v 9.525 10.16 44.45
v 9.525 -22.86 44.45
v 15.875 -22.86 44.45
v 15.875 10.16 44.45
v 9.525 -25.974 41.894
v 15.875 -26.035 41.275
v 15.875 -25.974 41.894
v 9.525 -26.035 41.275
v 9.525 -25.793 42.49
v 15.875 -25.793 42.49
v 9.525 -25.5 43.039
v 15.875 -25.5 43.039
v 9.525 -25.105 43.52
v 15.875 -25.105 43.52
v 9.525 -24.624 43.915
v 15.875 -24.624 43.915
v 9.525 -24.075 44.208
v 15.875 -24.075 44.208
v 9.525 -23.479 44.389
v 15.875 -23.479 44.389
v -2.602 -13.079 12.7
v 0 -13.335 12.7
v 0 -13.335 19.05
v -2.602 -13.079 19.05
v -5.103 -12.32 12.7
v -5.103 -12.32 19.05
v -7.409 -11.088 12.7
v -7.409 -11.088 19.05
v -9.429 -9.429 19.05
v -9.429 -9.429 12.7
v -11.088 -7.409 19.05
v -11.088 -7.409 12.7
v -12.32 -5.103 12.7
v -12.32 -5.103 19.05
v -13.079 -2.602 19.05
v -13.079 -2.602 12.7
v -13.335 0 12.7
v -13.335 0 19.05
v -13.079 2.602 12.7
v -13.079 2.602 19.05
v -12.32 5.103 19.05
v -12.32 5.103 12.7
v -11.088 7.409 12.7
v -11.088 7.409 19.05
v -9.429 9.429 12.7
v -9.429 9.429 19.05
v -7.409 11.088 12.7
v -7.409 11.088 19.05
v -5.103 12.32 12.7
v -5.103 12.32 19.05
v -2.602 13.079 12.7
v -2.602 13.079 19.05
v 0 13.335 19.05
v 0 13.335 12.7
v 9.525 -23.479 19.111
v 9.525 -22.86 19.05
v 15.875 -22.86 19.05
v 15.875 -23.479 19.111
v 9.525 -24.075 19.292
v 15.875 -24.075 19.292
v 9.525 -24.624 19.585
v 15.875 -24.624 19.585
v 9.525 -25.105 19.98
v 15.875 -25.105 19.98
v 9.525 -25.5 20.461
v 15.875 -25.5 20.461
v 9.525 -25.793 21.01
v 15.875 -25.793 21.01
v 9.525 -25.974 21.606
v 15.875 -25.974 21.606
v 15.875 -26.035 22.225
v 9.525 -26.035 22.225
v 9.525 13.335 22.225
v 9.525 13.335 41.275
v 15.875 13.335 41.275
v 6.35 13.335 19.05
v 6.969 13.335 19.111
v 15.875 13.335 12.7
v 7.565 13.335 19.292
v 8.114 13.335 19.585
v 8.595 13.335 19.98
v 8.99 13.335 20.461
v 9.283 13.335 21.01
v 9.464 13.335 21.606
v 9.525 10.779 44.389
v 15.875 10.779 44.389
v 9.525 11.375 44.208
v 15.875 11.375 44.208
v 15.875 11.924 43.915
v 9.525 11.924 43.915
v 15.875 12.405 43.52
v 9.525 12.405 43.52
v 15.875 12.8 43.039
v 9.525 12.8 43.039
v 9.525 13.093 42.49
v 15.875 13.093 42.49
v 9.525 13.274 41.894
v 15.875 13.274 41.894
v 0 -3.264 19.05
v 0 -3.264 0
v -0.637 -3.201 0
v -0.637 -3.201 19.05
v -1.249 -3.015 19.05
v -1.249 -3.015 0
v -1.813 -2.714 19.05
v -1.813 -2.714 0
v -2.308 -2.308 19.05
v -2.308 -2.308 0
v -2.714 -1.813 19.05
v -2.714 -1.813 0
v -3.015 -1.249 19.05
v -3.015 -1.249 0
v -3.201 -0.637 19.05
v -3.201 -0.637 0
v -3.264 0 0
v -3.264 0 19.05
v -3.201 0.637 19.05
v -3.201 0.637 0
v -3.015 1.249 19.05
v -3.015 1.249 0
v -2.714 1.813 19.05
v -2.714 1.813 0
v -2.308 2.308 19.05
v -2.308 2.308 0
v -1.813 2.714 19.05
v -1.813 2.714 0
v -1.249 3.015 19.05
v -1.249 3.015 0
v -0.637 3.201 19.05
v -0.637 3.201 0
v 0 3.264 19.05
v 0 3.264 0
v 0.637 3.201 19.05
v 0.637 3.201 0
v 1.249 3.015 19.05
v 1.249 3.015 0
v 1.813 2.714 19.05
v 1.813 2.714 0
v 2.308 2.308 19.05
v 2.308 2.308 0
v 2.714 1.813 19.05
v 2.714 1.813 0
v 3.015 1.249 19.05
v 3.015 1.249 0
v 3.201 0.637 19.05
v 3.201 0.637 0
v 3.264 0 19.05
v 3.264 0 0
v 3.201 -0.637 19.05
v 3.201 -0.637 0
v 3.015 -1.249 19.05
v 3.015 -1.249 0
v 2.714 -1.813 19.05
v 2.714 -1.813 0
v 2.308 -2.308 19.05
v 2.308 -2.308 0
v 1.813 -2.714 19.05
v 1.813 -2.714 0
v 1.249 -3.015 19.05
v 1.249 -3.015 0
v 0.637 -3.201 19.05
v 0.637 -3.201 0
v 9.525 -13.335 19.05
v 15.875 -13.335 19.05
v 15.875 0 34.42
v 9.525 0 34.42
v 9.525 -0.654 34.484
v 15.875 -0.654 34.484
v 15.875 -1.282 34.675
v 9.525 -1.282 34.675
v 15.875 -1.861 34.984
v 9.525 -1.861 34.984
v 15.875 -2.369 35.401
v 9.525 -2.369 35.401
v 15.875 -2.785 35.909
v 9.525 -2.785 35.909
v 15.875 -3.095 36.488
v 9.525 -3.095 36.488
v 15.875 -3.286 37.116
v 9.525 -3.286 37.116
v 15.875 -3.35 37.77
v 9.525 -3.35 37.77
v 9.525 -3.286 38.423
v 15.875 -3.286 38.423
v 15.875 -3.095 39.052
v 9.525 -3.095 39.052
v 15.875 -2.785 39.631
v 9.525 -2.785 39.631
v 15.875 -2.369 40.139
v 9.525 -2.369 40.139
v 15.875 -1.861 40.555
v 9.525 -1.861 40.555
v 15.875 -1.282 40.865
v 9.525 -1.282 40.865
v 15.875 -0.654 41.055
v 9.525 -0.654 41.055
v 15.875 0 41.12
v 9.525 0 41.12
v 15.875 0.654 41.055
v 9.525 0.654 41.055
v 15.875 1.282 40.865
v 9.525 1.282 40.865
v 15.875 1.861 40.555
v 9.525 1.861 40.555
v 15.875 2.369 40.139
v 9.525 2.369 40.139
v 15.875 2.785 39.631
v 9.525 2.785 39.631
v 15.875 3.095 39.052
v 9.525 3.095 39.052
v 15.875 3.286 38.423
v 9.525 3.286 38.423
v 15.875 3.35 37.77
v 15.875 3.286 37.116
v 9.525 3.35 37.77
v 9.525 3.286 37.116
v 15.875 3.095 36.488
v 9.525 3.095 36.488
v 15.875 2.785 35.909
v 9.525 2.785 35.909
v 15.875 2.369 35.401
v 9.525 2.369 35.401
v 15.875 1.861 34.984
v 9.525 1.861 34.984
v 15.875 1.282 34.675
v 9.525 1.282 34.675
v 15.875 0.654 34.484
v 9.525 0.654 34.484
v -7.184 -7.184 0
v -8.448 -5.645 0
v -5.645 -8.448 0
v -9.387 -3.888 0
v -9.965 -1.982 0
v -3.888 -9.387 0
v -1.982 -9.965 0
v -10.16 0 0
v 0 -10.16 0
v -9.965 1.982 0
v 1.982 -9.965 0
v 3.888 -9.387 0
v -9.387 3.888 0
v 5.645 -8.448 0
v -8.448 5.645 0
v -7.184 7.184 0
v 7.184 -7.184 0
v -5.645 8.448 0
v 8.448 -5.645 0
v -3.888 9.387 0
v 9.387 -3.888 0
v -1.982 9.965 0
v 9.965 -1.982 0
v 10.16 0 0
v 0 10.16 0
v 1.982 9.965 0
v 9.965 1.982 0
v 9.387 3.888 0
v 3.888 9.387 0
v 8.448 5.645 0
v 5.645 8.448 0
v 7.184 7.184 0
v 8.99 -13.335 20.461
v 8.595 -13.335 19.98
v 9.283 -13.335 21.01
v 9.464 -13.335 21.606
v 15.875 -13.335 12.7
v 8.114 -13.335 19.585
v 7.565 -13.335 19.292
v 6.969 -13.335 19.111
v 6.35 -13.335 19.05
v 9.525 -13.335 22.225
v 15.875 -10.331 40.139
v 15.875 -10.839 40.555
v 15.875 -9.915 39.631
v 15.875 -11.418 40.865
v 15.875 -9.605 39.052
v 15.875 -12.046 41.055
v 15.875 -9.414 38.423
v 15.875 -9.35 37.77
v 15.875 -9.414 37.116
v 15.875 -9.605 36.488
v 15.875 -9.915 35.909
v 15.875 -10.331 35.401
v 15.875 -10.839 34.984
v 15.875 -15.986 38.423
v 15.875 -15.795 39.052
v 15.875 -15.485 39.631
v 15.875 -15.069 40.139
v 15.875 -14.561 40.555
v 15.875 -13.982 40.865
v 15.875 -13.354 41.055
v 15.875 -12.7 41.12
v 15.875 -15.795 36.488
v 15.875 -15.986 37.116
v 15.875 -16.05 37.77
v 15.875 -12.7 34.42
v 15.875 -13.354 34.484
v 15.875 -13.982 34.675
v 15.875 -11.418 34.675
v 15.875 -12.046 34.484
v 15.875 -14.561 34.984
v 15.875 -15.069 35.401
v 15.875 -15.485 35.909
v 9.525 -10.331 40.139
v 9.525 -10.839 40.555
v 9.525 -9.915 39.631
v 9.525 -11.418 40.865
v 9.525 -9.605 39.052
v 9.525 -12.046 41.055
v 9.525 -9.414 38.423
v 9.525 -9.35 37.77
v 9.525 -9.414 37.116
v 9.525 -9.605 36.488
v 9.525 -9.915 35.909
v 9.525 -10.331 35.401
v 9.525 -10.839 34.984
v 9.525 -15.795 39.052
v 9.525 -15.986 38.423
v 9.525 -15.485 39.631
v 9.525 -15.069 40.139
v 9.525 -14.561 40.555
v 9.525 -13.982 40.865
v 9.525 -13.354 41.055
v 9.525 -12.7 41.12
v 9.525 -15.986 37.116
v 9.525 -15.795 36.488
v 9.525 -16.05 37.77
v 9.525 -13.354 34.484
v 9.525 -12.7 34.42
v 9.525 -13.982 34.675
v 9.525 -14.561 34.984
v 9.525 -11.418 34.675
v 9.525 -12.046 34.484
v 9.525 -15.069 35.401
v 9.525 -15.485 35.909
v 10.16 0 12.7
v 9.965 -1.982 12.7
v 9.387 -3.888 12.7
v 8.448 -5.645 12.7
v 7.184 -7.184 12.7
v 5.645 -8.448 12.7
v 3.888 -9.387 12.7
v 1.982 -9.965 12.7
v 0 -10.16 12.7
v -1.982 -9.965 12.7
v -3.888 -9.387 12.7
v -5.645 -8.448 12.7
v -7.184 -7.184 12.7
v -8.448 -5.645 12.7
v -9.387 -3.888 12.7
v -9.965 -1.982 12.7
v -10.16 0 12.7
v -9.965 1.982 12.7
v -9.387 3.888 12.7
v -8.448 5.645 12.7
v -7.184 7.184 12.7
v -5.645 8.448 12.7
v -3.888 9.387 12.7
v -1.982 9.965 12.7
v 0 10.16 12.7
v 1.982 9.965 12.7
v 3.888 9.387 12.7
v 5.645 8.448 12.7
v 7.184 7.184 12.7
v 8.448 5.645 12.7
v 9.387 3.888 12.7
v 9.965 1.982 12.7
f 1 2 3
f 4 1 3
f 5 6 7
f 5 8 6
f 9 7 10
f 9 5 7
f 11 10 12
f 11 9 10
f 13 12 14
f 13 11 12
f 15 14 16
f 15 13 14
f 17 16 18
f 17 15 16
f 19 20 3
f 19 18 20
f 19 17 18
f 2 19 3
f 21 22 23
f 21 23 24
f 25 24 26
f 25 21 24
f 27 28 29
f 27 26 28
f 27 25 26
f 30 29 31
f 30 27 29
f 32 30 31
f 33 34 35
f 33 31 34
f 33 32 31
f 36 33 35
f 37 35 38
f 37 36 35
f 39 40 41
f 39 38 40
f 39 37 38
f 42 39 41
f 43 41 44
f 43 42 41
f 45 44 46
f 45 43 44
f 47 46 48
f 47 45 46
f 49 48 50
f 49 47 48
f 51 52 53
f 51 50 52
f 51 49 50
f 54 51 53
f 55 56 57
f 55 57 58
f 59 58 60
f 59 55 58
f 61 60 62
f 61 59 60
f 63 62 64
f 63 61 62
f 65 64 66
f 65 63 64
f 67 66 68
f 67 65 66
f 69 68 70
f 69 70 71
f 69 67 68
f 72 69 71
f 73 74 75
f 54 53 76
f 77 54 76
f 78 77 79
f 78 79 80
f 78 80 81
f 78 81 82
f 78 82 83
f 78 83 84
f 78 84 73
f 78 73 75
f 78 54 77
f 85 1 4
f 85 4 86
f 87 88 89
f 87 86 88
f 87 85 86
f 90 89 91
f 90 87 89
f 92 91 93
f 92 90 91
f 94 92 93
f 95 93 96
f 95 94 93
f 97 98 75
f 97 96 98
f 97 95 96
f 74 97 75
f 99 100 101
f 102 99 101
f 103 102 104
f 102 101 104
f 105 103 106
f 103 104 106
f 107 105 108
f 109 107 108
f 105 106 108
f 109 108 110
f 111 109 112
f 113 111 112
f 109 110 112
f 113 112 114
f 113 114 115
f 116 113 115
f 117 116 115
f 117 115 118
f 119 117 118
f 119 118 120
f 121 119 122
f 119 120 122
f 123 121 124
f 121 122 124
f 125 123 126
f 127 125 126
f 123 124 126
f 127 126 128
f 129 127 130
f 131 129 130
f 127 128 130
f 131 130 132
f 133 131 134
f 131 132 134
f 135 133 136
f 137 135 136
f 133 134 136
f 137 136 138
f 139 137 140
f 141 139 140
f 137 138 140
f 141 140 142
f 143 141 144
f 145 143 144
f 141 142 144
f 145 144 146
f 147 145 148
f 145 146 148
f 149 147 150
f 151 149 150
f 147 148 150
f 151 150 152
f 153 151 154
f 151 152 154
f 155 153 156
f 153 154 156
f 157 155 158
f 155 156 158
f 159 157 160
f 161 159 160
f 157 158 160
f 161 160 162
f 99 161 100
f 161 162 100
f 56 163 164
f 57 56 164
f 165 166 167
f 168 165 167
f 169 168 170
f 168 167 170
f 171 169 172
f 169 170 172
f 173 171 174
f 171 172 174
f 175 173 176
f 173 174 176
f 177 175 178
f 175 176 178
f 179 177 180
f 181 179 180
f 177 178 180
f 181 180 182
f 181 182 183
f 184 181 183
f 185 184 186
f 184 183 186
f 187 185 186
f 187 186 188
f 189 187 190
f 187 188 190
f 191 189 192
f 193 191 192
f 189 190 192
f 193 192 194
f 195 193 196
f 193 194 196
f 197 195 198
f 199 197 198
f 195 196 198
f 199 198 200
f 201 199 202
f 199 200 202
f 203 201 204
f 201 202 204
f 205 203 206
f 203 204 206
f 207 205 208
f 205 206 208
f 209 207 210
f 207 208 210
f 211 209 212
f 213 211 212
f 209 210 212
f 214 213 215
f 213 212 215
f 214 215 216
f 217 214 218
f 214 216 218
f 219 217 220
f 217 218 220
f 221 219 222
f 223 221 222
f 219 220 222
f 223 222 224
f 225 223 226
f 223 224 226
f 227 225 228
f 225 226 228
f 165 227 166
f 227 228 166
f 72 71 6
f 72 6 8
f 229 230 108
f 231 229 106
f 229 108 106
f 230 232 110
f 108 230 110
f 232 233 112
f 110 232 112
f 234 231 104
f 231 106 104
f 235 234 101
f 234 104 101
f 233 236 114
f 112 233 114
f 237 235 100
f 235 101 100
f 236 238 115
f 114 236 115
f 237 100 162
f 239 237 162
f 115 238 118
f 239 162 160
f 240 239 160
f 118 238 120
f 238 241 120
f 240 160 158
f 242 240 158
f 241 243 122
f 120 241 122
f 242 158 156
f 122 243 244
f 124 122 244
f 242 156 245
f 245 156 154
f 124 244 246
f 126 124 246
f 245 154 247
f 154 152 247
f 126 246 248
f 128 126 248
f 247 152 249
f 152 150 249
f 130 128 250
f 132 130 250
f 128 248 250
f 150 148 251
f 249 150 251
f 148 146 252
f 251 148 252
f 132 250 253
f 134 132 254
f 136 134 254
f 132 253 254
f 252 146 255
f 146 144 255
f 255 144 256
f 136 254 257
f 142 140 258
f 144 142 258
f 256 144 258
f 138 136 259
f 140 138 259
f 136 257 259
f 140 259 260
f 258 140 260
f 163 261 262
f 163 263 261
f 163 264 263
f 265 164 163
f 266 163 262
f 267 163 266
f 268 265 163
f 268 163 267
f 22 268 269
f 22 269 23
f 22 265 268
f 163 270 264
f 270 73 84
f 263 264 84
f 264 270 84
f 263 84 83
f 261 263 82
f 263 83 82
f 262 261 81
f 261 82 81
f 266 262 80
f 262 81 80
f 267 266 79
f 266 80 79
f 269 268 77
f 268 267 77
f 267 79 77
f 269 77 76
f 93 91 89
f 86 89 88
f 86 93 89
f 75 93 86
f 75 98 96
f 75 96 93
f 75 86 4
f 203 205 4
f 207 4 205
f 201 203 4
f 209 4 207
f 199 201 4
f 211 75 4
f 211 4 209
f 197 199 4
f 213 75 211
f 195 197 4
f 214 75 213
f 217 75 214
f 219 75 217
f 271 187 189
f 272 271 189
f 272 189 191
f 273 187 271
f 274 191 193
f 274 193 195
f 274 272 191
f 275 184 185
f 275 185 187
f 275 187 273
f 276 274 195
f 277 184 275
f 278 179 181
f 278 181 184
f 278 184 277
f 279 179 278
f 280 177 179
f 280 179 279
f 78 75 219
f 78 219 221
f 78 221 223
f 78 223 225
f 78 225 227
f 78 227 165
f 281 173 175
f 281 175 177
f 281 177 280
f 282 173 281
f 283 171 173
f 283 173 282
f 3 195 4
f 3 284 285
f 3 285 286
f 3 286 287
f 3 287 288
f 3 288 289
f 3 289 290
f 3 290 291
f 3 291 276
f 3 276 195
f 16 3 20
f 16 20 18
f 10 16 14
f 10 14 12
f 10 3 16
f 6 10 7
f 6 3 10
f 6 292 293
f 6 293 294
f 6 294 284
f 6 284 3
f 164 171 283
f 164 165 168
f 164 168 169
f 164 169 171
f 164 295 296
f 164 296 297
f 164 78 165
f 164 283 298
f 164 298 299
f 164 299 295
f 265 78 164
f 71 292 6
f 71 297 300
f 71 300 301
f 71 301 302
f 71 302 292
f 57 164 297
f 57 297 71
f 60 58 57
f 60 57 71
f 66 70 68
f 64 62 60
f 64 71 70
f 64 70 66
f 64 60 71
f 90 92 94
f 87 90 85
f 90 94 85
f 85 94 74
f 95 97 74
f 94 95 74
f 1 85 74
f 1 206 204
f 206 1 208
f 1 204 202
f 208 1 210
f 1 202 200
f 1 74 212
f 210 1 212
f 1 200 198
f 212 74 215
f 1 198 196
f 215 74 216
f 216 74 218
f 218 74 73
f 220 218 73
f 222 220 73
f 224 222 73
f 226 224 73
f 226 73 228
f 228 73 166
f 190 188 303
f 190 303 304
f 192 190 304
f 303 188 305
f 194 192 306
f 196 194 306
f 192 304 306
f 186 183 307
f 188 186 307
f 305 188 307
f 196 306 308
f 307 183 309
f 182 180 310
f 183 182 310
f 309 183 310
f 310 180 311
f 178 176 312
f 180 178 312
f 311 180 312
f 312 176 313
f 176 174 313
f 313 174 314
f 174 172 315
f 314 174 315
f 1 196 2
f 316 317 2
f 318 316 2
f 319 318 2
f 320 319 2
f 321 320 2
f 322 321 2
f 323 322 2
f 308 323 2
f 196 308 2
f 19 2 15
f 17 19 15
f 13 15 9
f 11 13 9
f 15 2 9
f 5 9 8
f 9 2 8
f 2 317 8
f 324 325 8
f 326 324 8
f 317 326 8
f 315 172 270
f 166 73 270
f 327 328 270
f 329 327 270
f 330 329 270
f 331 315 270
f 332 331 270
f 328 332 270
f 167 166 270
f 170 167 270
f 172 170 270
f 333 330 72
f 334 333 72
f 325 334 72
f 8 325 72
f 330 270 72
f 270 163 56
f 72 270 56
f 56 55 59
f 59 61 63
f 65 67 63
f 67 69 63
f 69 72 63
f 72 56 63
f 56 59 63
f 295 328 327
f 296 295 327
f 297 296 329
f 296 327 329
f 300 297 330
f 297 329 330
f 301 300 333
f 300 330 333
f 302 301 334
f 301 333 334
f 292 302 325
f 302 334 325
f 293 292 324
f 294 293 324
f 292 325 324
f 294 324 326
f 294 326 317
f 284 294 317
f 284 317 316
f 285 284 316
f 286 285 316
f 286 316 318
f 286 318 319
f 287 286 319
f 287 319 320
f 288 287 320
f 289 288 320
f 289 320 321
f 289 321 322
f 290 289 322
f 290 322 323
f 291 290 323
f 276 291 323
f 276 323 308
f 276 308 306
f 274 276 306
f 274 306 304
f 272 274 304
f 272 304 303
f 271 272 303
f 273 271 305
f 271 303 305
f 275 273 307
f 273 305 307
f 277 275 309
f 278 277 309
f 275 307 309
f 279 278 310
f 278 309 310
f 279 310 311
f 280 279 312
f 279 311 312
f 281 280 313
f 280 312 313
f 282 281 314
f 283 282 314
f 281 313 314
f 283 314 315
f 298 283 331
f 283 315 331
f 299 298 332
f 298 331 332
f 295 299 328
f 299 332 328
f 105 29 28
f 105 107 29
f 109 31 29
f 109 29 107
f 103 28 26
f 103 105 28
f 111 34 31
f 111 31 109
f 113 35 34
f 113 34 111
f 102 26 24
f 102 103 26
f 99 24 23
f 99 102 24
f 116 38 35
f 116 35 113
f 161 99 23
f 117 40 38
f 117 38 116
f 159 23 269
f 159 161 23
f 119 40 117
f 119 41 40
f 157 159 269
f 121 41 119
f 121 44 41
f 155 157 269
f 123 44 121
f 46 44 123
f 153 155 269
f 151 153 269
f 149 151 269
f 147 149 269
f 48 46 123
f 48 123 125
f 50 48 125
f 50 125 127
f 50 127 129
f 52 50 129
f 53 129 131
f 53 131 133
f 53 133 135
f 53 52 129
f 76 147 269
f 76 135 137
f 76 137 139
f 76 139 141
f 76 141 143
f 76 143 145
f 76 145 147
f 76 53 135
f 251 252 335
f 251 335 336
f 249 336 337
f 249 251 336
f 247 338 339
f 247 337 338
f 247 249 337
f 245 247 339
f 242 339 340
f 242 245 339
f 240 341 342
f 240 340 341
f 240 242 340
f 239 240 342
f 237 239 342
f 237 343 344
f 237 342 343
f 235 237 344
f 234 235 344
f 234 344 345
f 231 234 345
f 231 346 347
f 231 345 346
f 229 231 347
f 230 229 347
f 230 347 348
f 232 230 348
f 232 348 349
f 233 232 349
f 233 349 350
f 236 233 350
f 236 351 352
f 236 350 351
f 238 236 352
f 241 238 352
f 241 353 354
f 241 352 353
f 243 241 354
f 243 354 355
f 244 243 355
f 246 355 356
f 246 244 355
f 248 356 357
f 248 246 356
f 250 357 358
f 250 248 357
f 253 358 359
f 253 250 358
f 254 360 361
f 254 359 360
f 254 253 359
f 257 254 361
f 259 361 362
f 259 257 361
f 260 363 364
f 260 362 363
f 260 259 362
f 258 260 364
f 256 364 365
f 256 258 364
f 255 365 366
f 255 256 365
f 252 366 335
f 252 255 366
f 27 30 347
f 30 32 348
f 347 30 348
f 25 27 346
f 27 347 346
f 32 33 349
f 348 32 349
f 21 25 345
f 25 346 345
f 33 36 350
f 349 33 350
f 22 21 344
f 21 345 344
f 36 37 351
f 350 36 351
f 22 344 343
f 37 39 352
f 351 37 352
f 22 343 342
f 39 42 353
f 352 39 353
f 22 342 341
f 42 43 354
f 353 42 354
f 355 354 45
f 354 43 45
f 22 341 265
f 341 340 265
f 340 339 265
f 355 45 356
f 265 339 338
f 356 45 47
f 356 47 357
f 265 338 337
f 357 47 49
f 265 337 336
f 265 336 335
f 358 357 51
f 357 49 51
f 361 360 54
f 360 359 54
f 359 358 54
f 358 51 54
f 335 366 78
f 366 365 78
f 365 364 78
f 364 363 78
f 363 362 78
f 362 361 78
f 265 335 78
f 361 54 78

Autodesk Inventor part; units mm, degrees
ref_plane "YZ Plane" through (0, 0, 0) normal (1, 0, 0) x (0, 1, 0)
ref_plane "XZ Plane" through (0, 0, 0) normal (0, 1, 0) x (-1, 0, 0)
ref_plane "XY Plane" through (0, 0, 0) normal (0, 0, 1) x (1, 0, 0)
sketch "Sketch1" plane through (0, 0, 0) normal (0, 0, 1) x (1, 0, 0)
  circle A0 centre (0, 0) radius 10.16
  circle A1 centre (0, 0) radius 8.7376
  dimension "d0" = 20.32
  dimension "d6" = 17.4752
extrude "Extrusion1" add sketch "Sketch1" along normal blind 12.7 contours A0 | A1
sketch "Sketch2" plane through (0, 0, 12.7) normal (0, 0, 1) x (1, 0, 0)
  circle A0 centre (0, 0) radius 10.16 projected
  circle A1 centre (0, 0) radius 13.335 construction
  line L0 (0, 13.335) -> (15.875, 13.335)
  line L1 (15.875, 13.335) -> (15.875, -13.335)
  line L2 (15.875, -13.335) -> (0, -13.335)
  arc A2 (0, 13.335) -> (0, -13.335) centre (0, 0) ccw
  point P0 (15.875, 0)
  dimension "d3" = 3.175
  dimension "d14" = 15.875
extrude "Extrusion2" add sketch "Sketch2" along normal blind 6.35 contours A0 | L0 L1 L2 A2
sketch "Sketch4" plane through (0, 0, 19.05) normal (0, 0, 1) x (1, 0, 0)
  arc A0 (0, 13.335) -> (0, -13.335) centre (0, 0) ccw projected
hole "Hole2" at (0, 0, 19.05) direction (0, 0, -1) diameter 6.5278 end through all clearance for "Flat Head Machine Screw (82)" size "1/4" standard "Ansi Unified Screw Threads"
sketch "Sketch5" plane through (0, 0, 19.05) normal (0, 0, 1) x (1, 0, 0)
  line L0 (15.875, 13.335) -> (0, 13.335) projected
  line L1 (0, -13.335) -> (15.875, -13.335) projected
  line L2 (15.875, 13.335) -> (9.525, 13.335)
  line L3 (9.525, 13.335) -> (9.525, -13.335)
  line L4 (9.525, -13.335) -> (15.875, -13.335)
  line L5 (15.875, -13.335) -> (15.875, 13.335)
  line L6 (9.525, -13.335) -> (15.875, -13.335)
  line L7 (15.875, -13.335) -> (15.875, -26.035)
  line L8 (15.875, -26.035) -> (9.525, -26.035)
  line L9 (9.525, -26.035) -> (9.525, -13.335)
  point P0 (0, 0)
  point P1 (15.875, -19.685)
  point P2 (15.875, 0)
  dimension "d22" = 6.35
  dimension "d36" = 12.7
extrude "Extrusion3" add sketch "Sketch5" along normal blind 25.4
fillet "Fillet1" radius 3.175 4 edges at (9.525, 0, 19.05) (12.7, -26.035, 19.05) (12.7, -26.035, 44.45) (12.7, 13.335, 44.45)
sketch "Sketch6" plane through (15.875, -13.335, 12.7) normal (1, 0, 0) x (0, 0, -1)
  line L0 (-25.0698, 13.335) -> (-25.0698, 0.635) construction
  line L1 (0, 26.67) -> (-28.575, 26.67) construction
  line L2 (-31.75, -9.525) -> (-31.75, 23.495) projected
  point P0 (12.7, 13.335)
  point P1 (-25.0698, 6.985)
  dimension "d26" = 12.7
  dimension "d35" = 13.335
  dimension "d37" = 6.6802
hole "Hole3" at (15.875, 0, 37.7698) at (15.875, -12.7, 37.7698) direction (-1, 0, 0) diameter 6.7 end through all
properties part number "EL2-020" material "ABS Plastic"
